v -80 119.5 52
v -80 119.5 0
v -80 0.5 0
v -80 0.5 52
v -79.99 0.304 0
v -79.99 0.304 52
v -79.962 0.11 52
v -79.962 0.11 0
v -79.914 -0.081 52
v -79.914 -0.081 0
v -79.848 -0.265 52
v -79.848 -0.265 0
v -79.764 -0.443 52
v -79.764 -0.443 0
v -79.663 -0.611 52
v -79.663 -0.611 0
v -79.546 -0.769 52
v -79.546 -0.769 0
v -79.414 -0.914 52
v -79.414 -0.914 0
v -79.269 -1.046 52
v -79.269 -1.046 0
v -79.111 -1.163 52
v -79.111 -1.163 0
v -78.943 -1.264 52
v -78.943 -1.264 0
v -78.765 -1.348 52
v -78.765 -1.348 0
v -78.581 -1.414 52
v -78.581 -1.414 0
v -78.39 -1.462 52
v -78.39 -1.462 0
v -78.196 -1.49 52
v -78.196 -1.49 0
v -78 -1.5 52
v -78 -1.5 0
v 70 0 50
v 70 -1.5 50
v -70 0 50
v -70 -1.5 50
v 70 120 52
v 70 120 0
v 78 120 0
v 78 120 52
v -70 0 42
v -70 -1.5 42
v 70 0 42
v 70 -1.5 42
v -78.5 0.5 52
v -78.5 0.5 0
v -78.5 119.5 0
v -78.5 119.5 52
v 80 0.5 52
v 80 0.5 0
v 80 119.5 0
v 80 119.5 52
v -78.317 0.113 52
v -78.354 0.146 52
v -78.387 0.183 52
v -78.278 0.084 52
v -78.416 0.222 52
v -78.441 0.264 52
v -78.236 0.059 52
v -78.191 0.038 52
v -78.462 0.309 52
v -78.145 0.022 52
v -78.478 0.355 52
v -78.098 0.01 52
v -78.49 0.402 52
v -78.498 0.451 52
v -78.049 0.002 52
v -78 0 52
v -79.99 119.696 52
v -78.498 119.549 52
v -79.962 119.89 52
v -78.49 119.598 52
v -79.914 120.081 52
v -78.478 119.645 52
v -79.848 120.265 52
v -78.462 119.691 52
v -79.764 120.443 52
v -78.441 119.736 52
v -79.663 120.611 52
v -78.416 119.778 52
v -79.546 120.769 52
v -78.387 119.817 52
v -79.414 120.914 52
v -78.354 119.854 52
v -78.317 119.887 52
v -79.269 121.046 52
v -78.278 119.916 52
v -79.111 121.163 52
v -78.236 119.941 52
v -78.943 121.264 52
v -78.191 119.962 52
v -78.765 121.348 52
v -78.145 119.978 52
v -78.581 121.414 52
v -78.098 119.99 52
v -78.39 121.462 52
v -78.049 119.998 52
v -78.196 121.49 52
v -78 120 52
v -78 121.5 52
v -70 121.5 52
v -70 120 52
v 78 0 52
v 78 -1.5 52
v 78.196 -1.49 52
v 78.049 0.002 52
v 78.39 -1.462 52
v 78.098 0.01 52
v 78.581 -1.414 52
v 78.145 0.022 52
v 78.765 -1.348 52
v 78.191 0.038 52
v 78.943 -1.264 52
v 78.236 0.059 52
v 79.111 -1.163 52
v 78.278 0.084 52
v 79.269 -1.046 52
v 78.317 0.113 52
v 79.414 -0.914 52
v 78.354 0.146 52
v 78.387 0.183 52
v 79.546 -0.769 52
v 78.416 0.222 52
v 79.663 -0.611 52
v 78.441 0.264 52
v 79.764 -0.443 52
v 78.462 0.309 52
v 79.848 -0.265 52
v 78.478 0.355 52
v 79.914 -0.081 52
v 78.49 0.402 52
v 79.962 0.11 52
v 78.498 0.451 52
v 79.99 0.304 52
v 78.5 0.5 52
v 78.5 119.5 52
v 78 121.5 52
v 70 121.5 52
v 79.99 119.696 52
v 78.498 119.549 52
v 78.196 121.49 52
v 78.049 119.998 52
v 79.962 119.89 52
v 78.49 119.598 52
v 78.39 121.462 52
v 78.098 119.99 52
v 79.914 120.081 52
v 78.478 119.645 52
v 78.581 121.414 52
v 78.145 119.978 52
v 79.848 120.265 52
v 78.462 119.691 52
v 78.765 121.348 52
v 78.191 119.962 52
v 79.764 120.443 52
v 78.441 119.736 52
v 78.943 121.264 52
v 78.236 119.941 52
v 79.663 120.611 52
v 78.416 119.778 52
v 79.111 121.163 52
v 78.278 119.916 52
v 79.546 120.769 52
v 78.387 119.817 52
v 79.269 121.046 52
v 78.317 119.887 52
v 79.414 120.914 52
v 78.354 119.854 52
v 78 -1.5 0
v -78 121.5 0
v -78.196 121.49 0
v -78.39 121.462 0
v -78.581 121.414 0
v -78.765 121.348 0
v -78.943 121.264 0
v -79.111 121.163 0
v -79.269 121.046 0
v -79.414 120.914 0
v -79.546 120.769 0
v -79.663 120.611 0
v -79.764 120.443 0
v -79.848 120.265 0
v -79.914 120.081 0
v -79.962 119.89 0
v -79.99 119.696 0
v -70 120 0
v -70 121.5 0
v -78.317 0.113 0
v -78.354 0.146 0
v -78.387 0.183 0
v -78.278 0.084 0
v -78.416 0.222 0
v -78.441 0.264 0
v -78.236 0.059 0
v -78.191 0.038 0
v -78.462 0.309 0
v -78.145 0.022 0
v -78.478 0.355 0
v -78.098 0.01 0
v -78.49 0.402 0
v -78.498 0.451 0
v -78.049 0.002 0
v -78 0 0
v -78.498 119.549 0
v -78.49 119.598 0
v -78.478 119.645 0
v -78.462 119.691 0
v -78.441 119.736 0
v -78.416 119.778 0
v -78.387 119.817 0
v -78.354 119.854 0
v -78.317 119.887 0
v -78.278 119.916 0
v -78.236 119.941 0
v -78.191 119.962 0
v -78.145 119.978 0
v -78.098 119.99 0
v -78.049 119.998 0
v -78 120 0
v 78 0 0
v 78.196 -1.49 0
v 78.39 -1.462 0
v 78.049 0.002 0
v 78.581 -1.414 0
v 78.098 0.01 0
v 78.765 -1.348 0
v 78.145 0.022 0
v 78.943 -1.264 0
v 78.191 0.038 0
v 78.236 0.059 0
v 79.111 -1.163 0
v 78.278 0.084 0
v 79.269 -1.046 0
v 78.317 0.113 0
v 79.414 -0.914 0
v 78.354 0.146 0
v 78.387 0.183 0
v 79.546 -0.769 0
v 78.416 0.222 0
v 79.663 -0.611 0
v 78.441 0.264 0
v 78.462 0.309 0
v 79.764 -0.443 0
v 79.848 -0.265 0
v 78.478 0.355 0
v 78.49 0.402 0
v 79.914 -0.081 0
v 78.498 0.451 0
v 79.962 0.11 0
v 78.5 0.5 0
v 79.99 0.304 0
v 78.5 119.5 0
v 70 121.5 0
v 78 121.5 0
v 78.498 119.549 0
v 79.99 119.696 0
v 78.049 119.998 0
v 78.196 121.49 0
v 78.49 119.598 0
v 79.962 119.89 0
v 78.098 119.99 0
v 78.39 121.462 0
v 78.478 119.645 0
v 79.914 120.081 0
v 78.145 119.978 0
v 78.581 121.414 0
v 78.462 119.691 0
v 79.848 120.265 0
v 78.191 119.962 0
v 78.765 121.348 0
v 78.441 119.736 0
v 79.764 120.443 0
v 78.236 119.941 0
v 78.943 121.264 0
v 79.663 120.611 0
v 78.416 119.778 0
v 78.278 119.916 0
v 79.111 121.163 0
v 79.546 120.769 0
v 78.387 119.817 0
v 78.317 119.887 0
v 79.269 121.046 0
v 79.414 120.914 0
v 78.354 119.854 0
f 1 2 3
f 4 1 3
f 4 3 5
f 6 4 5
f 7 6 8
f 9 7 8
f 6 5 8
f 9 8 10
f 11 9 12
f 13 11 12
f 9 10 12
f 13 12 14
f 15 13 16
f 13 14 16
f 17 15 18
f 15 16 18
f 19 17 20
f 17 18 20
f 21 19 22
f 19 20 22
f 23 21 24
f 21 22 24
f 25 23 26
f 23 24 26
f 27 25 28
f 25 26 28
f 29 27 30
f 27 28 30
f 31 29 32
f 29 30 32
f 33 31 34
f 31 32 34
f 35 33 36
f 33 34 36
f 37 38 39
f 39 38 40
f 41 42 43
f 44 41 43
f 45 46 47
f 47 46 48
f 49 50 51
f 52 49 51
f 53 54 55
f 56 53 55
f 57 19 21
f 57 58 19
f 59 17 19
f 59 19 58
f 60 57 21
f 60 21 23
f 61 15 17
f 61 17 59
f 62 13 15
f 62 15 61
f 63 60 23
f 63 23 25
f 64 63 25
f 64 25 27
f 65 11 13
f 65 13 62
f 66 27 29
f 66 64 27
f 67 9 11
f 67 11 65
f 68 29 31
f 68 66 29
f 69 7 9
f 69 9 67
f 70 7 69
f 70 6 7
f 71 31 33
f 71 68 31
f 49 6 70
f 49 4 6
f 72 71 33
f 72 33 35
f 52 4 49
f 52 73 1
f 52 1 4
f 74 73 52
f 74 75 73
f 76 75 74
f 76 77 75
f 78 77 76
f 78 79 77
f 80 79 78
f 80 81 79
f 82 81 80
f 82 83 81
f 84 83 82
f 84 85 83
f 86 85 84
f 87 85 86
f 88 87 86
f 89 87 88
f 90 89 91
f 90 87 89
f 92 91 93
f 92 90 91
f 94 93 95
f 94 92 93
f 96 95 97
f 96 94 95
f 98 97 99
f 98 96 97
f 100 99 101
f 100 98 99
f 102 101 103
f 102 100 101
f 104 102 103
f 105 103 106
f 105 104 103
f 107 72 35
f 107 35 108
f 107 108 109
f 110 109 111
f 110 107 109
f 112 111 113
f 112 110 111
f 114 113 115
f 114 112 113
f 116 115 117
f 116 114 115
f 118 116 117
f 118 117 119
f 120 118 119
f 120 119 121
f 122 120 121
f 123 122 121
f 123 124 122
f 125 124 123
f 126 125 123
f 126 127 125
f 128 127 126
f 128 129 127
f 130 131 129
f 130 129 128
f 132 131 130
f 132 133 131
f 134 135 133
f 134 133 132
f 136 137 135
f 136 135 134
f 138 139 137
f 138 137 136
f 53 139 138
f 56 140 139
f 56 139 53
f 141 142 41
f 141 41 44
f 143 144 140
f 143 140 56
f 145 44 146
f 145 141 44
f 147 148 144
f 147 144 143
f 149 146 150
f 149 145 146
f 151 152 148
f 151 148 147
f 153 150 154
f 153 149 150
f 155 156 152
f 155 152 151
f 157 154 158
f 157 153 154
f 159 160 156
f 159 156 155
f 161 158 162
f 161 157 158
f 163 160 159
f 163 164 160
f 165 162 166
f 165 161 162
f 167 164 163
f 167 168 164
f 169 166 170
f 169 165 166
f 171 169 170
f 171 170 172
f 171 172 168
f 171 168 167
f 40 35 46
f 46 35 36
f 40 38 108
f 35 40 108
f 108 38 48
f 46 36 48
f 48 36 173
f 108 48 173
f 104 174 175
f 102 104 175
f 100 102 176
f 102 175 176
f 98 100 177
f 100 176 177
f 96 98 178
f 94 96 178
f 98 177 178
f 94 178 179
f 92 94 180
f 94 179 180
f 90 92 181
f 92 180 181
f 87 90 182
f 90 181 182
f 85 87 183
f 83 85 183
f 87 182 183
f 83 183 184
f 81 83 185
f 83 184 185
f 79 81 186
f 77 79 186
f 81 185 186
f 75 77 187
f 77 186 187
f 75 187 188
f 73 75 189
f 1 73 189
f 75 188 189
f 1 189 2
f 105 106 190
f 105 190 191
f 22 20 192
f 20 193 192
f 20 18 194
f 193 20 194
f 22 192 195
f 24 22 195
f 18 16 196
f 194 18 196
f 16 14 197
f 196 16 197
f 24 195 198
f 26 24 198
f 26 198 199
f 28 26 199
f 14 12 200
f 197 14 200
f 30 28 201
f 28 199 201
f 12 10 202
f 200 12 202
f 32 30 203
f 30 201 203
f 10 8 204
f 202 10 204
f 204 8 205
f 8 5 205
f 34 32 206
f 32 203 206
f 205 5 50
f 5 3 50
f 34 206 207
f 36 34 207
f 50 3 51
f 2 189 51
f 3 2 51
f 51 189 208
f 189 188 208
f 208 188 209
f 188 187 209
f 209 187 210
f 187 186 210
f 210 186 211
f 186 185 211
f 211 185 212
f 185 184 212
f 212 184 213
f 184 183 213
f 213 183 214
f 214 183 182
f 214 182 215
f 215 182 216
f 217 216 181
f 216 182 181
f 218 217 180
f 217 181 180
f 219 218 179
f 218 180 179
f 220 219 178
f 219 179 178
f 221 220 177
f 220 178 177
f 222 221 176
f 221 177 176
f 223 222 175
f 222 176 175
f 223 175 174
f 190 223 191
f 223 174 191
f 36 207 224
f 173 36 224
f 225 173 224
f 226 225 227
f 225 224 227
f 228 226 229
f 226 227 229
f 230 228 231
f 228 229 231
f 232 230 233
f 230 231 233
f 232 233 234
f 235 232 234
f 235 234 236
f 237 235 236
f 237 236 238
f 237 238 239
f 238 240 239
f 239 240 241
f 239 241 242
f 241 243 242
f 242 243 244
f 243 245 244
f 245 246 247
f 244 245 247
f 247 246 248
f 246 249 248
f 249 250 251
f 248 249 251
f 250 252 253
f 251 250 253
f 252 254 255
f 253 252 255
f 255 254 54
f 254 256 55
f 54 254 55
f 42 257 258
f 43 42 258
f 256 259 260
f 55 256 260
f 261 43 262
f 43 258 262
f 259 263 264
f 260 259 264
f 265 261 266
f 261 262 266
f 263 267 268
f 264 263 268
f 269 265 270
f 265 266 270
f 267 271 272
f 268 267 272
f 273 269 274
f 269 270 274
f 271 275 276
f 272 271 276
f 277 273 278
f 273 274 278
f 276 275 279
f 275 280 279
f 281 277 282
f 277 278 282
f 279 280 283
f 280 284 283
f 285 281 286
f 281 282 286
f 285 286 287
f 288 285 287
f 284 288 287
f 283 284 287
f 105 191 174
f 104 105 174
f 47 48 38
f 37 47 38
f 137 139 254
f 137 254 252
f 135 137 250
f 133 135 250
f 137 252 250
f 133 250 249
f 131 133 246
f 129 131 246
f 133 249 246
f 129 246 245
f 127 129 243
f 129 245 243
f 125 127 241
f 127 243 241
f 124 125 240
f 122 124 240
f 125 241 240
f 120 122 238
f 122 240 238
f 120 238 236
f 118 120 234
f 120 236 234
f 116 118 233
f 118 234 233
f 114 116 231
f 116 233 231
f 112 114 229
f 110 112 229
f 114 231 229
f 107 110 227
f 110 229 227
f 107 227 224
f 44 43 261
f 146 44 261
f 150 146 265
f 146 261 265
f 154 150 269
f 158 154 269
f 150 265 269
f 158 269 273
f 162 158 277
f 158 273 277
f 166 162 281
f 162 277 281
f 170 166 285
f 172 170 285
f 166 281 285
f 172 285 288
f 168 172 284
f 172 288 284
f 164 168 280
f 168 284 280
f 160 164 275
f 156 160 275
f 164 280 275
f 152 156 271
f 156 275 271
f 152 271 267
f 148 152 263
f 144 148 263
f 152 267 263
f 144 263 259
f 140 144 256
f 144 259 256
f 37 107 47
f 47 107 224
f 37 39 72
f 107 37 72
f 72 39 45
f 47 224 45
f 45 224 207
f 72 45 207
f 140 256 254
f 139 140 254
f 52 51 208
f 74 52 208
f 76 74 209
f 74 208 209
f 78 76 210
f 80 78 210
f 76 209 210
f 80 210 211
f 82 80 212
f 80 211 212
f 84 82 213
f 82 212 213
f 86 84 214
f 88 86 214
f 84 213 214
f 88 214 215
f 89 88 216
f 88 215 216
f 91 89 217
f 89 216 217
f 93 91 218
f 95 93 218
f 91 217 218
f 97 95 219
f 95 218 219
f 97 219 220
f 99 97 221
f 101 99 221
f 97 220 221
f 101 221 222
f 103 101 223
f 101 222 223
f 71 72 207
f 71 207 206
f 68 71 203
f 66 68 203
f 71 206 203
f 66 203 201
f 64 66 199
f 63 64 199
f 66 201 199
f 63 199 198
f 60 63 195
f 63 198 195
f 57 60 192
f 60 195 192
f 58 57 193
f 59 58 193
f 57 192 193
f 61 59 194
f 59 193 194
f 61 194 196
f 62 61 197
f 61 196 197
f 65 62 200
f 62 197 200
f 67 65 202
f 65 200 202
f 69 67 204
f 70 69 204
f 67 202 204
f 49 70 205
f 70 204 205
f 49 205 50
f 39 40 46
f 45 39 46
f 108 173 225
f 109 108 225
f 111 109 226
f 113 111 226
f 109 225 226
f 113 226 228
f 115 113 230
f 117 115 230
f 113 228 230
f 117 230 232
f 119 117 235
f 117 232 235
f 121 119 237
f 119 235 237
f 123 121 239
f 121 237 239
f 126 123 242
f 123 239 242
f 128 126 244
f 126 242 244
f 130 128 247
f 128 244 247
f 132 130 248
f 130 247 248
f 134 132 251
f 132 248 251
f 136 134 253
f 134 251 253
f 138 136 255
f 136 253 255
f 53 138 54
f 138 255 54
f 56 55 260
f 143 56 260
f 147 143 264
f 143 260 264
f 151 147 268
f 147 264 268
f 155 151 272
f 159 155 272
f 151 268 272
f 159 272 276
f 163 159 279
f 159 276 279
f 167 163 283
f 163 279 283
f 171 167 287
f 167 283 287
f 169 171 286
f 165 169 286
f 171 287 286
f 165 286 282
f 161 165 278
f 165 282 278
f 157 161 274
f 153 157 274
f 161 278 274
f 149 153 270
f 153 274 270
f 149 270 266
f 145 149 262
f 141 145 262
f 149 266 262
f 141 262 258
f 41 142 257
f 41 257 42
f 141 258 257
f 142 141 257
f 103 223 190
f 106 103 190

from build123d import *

# Parameters (mm, degrees)
F1_DEPTH = 52
F3_DEPTH = 123.001


with BuildPart() as f1:
    # F0 (on Top) → F1 (new body)
    with BuildSketch(Plane.XY):
        with BuildLine():
            Line((78, 0), (0, 0))
            Line((0, 0), (-78, 0))
            ThreePointArc((-78, 0), (-78.353553, 0.146447), (-78.5, 0.5))
            Line((-78.5, 0.5), (-78.5, 119.5))
            ThreePointArc((-78.5, 119.5), (-78.353553, 119.853553), (-78, 120))
            Line((-78, 120), (-70, 120))
            Line((-70, 120), (-70, 121.5))
            Line((-70, 121.5), (-78, 121.5))
            ThreePointArc((-78, 121.5), (-79.414214, 120.914214), (-80, 119.5))
            Line((-80, 119.5), (-80, 0.5))
            ThreePointArc((-80, 0.5), (-79.414214, -0.914214), (-78, -1.5))
            Line((-78, -1.5), (0, -1.5))
            Line((0, -1.5), (78, -1.5))
            ThreePointArc((78, -1.5), (79.414214, -0.914214), (80, 0.5))
            Line((80, 0.5), (80, 119.5))
            ThreePointArc((80, 119.5), (79.414214, 120.914214), (78, 121.5))
            Line((78, 121.5), (70, 121.5))
            Line((70, 121.5), (70, 120))
            Line((70, 120), (78, 120))
            ThreePointArc((78, 120), (78.353553, 119.853553), (78.5, 119.5))
            Line((78.5, 119.5), (78.5, 0.5))
            ThreePointArc((78.5, 0.5), (78.353553, 0.146447), (78, 0))
        make_face()
    extrude(amount=F1_DEPTH)

    # F2 (on face) → F3 (cut, through all)
    with BuildSketch(Plane.XZ.offset(1.5)):
        Polygon((0, 50), (-70, 50), (-70, 42), (0, 42), (70, 42), (70, 50), align=None)
    extrude(amount=-F3_DEPTH, mode=Mode.SUBTRACT)


solid = f1.part
